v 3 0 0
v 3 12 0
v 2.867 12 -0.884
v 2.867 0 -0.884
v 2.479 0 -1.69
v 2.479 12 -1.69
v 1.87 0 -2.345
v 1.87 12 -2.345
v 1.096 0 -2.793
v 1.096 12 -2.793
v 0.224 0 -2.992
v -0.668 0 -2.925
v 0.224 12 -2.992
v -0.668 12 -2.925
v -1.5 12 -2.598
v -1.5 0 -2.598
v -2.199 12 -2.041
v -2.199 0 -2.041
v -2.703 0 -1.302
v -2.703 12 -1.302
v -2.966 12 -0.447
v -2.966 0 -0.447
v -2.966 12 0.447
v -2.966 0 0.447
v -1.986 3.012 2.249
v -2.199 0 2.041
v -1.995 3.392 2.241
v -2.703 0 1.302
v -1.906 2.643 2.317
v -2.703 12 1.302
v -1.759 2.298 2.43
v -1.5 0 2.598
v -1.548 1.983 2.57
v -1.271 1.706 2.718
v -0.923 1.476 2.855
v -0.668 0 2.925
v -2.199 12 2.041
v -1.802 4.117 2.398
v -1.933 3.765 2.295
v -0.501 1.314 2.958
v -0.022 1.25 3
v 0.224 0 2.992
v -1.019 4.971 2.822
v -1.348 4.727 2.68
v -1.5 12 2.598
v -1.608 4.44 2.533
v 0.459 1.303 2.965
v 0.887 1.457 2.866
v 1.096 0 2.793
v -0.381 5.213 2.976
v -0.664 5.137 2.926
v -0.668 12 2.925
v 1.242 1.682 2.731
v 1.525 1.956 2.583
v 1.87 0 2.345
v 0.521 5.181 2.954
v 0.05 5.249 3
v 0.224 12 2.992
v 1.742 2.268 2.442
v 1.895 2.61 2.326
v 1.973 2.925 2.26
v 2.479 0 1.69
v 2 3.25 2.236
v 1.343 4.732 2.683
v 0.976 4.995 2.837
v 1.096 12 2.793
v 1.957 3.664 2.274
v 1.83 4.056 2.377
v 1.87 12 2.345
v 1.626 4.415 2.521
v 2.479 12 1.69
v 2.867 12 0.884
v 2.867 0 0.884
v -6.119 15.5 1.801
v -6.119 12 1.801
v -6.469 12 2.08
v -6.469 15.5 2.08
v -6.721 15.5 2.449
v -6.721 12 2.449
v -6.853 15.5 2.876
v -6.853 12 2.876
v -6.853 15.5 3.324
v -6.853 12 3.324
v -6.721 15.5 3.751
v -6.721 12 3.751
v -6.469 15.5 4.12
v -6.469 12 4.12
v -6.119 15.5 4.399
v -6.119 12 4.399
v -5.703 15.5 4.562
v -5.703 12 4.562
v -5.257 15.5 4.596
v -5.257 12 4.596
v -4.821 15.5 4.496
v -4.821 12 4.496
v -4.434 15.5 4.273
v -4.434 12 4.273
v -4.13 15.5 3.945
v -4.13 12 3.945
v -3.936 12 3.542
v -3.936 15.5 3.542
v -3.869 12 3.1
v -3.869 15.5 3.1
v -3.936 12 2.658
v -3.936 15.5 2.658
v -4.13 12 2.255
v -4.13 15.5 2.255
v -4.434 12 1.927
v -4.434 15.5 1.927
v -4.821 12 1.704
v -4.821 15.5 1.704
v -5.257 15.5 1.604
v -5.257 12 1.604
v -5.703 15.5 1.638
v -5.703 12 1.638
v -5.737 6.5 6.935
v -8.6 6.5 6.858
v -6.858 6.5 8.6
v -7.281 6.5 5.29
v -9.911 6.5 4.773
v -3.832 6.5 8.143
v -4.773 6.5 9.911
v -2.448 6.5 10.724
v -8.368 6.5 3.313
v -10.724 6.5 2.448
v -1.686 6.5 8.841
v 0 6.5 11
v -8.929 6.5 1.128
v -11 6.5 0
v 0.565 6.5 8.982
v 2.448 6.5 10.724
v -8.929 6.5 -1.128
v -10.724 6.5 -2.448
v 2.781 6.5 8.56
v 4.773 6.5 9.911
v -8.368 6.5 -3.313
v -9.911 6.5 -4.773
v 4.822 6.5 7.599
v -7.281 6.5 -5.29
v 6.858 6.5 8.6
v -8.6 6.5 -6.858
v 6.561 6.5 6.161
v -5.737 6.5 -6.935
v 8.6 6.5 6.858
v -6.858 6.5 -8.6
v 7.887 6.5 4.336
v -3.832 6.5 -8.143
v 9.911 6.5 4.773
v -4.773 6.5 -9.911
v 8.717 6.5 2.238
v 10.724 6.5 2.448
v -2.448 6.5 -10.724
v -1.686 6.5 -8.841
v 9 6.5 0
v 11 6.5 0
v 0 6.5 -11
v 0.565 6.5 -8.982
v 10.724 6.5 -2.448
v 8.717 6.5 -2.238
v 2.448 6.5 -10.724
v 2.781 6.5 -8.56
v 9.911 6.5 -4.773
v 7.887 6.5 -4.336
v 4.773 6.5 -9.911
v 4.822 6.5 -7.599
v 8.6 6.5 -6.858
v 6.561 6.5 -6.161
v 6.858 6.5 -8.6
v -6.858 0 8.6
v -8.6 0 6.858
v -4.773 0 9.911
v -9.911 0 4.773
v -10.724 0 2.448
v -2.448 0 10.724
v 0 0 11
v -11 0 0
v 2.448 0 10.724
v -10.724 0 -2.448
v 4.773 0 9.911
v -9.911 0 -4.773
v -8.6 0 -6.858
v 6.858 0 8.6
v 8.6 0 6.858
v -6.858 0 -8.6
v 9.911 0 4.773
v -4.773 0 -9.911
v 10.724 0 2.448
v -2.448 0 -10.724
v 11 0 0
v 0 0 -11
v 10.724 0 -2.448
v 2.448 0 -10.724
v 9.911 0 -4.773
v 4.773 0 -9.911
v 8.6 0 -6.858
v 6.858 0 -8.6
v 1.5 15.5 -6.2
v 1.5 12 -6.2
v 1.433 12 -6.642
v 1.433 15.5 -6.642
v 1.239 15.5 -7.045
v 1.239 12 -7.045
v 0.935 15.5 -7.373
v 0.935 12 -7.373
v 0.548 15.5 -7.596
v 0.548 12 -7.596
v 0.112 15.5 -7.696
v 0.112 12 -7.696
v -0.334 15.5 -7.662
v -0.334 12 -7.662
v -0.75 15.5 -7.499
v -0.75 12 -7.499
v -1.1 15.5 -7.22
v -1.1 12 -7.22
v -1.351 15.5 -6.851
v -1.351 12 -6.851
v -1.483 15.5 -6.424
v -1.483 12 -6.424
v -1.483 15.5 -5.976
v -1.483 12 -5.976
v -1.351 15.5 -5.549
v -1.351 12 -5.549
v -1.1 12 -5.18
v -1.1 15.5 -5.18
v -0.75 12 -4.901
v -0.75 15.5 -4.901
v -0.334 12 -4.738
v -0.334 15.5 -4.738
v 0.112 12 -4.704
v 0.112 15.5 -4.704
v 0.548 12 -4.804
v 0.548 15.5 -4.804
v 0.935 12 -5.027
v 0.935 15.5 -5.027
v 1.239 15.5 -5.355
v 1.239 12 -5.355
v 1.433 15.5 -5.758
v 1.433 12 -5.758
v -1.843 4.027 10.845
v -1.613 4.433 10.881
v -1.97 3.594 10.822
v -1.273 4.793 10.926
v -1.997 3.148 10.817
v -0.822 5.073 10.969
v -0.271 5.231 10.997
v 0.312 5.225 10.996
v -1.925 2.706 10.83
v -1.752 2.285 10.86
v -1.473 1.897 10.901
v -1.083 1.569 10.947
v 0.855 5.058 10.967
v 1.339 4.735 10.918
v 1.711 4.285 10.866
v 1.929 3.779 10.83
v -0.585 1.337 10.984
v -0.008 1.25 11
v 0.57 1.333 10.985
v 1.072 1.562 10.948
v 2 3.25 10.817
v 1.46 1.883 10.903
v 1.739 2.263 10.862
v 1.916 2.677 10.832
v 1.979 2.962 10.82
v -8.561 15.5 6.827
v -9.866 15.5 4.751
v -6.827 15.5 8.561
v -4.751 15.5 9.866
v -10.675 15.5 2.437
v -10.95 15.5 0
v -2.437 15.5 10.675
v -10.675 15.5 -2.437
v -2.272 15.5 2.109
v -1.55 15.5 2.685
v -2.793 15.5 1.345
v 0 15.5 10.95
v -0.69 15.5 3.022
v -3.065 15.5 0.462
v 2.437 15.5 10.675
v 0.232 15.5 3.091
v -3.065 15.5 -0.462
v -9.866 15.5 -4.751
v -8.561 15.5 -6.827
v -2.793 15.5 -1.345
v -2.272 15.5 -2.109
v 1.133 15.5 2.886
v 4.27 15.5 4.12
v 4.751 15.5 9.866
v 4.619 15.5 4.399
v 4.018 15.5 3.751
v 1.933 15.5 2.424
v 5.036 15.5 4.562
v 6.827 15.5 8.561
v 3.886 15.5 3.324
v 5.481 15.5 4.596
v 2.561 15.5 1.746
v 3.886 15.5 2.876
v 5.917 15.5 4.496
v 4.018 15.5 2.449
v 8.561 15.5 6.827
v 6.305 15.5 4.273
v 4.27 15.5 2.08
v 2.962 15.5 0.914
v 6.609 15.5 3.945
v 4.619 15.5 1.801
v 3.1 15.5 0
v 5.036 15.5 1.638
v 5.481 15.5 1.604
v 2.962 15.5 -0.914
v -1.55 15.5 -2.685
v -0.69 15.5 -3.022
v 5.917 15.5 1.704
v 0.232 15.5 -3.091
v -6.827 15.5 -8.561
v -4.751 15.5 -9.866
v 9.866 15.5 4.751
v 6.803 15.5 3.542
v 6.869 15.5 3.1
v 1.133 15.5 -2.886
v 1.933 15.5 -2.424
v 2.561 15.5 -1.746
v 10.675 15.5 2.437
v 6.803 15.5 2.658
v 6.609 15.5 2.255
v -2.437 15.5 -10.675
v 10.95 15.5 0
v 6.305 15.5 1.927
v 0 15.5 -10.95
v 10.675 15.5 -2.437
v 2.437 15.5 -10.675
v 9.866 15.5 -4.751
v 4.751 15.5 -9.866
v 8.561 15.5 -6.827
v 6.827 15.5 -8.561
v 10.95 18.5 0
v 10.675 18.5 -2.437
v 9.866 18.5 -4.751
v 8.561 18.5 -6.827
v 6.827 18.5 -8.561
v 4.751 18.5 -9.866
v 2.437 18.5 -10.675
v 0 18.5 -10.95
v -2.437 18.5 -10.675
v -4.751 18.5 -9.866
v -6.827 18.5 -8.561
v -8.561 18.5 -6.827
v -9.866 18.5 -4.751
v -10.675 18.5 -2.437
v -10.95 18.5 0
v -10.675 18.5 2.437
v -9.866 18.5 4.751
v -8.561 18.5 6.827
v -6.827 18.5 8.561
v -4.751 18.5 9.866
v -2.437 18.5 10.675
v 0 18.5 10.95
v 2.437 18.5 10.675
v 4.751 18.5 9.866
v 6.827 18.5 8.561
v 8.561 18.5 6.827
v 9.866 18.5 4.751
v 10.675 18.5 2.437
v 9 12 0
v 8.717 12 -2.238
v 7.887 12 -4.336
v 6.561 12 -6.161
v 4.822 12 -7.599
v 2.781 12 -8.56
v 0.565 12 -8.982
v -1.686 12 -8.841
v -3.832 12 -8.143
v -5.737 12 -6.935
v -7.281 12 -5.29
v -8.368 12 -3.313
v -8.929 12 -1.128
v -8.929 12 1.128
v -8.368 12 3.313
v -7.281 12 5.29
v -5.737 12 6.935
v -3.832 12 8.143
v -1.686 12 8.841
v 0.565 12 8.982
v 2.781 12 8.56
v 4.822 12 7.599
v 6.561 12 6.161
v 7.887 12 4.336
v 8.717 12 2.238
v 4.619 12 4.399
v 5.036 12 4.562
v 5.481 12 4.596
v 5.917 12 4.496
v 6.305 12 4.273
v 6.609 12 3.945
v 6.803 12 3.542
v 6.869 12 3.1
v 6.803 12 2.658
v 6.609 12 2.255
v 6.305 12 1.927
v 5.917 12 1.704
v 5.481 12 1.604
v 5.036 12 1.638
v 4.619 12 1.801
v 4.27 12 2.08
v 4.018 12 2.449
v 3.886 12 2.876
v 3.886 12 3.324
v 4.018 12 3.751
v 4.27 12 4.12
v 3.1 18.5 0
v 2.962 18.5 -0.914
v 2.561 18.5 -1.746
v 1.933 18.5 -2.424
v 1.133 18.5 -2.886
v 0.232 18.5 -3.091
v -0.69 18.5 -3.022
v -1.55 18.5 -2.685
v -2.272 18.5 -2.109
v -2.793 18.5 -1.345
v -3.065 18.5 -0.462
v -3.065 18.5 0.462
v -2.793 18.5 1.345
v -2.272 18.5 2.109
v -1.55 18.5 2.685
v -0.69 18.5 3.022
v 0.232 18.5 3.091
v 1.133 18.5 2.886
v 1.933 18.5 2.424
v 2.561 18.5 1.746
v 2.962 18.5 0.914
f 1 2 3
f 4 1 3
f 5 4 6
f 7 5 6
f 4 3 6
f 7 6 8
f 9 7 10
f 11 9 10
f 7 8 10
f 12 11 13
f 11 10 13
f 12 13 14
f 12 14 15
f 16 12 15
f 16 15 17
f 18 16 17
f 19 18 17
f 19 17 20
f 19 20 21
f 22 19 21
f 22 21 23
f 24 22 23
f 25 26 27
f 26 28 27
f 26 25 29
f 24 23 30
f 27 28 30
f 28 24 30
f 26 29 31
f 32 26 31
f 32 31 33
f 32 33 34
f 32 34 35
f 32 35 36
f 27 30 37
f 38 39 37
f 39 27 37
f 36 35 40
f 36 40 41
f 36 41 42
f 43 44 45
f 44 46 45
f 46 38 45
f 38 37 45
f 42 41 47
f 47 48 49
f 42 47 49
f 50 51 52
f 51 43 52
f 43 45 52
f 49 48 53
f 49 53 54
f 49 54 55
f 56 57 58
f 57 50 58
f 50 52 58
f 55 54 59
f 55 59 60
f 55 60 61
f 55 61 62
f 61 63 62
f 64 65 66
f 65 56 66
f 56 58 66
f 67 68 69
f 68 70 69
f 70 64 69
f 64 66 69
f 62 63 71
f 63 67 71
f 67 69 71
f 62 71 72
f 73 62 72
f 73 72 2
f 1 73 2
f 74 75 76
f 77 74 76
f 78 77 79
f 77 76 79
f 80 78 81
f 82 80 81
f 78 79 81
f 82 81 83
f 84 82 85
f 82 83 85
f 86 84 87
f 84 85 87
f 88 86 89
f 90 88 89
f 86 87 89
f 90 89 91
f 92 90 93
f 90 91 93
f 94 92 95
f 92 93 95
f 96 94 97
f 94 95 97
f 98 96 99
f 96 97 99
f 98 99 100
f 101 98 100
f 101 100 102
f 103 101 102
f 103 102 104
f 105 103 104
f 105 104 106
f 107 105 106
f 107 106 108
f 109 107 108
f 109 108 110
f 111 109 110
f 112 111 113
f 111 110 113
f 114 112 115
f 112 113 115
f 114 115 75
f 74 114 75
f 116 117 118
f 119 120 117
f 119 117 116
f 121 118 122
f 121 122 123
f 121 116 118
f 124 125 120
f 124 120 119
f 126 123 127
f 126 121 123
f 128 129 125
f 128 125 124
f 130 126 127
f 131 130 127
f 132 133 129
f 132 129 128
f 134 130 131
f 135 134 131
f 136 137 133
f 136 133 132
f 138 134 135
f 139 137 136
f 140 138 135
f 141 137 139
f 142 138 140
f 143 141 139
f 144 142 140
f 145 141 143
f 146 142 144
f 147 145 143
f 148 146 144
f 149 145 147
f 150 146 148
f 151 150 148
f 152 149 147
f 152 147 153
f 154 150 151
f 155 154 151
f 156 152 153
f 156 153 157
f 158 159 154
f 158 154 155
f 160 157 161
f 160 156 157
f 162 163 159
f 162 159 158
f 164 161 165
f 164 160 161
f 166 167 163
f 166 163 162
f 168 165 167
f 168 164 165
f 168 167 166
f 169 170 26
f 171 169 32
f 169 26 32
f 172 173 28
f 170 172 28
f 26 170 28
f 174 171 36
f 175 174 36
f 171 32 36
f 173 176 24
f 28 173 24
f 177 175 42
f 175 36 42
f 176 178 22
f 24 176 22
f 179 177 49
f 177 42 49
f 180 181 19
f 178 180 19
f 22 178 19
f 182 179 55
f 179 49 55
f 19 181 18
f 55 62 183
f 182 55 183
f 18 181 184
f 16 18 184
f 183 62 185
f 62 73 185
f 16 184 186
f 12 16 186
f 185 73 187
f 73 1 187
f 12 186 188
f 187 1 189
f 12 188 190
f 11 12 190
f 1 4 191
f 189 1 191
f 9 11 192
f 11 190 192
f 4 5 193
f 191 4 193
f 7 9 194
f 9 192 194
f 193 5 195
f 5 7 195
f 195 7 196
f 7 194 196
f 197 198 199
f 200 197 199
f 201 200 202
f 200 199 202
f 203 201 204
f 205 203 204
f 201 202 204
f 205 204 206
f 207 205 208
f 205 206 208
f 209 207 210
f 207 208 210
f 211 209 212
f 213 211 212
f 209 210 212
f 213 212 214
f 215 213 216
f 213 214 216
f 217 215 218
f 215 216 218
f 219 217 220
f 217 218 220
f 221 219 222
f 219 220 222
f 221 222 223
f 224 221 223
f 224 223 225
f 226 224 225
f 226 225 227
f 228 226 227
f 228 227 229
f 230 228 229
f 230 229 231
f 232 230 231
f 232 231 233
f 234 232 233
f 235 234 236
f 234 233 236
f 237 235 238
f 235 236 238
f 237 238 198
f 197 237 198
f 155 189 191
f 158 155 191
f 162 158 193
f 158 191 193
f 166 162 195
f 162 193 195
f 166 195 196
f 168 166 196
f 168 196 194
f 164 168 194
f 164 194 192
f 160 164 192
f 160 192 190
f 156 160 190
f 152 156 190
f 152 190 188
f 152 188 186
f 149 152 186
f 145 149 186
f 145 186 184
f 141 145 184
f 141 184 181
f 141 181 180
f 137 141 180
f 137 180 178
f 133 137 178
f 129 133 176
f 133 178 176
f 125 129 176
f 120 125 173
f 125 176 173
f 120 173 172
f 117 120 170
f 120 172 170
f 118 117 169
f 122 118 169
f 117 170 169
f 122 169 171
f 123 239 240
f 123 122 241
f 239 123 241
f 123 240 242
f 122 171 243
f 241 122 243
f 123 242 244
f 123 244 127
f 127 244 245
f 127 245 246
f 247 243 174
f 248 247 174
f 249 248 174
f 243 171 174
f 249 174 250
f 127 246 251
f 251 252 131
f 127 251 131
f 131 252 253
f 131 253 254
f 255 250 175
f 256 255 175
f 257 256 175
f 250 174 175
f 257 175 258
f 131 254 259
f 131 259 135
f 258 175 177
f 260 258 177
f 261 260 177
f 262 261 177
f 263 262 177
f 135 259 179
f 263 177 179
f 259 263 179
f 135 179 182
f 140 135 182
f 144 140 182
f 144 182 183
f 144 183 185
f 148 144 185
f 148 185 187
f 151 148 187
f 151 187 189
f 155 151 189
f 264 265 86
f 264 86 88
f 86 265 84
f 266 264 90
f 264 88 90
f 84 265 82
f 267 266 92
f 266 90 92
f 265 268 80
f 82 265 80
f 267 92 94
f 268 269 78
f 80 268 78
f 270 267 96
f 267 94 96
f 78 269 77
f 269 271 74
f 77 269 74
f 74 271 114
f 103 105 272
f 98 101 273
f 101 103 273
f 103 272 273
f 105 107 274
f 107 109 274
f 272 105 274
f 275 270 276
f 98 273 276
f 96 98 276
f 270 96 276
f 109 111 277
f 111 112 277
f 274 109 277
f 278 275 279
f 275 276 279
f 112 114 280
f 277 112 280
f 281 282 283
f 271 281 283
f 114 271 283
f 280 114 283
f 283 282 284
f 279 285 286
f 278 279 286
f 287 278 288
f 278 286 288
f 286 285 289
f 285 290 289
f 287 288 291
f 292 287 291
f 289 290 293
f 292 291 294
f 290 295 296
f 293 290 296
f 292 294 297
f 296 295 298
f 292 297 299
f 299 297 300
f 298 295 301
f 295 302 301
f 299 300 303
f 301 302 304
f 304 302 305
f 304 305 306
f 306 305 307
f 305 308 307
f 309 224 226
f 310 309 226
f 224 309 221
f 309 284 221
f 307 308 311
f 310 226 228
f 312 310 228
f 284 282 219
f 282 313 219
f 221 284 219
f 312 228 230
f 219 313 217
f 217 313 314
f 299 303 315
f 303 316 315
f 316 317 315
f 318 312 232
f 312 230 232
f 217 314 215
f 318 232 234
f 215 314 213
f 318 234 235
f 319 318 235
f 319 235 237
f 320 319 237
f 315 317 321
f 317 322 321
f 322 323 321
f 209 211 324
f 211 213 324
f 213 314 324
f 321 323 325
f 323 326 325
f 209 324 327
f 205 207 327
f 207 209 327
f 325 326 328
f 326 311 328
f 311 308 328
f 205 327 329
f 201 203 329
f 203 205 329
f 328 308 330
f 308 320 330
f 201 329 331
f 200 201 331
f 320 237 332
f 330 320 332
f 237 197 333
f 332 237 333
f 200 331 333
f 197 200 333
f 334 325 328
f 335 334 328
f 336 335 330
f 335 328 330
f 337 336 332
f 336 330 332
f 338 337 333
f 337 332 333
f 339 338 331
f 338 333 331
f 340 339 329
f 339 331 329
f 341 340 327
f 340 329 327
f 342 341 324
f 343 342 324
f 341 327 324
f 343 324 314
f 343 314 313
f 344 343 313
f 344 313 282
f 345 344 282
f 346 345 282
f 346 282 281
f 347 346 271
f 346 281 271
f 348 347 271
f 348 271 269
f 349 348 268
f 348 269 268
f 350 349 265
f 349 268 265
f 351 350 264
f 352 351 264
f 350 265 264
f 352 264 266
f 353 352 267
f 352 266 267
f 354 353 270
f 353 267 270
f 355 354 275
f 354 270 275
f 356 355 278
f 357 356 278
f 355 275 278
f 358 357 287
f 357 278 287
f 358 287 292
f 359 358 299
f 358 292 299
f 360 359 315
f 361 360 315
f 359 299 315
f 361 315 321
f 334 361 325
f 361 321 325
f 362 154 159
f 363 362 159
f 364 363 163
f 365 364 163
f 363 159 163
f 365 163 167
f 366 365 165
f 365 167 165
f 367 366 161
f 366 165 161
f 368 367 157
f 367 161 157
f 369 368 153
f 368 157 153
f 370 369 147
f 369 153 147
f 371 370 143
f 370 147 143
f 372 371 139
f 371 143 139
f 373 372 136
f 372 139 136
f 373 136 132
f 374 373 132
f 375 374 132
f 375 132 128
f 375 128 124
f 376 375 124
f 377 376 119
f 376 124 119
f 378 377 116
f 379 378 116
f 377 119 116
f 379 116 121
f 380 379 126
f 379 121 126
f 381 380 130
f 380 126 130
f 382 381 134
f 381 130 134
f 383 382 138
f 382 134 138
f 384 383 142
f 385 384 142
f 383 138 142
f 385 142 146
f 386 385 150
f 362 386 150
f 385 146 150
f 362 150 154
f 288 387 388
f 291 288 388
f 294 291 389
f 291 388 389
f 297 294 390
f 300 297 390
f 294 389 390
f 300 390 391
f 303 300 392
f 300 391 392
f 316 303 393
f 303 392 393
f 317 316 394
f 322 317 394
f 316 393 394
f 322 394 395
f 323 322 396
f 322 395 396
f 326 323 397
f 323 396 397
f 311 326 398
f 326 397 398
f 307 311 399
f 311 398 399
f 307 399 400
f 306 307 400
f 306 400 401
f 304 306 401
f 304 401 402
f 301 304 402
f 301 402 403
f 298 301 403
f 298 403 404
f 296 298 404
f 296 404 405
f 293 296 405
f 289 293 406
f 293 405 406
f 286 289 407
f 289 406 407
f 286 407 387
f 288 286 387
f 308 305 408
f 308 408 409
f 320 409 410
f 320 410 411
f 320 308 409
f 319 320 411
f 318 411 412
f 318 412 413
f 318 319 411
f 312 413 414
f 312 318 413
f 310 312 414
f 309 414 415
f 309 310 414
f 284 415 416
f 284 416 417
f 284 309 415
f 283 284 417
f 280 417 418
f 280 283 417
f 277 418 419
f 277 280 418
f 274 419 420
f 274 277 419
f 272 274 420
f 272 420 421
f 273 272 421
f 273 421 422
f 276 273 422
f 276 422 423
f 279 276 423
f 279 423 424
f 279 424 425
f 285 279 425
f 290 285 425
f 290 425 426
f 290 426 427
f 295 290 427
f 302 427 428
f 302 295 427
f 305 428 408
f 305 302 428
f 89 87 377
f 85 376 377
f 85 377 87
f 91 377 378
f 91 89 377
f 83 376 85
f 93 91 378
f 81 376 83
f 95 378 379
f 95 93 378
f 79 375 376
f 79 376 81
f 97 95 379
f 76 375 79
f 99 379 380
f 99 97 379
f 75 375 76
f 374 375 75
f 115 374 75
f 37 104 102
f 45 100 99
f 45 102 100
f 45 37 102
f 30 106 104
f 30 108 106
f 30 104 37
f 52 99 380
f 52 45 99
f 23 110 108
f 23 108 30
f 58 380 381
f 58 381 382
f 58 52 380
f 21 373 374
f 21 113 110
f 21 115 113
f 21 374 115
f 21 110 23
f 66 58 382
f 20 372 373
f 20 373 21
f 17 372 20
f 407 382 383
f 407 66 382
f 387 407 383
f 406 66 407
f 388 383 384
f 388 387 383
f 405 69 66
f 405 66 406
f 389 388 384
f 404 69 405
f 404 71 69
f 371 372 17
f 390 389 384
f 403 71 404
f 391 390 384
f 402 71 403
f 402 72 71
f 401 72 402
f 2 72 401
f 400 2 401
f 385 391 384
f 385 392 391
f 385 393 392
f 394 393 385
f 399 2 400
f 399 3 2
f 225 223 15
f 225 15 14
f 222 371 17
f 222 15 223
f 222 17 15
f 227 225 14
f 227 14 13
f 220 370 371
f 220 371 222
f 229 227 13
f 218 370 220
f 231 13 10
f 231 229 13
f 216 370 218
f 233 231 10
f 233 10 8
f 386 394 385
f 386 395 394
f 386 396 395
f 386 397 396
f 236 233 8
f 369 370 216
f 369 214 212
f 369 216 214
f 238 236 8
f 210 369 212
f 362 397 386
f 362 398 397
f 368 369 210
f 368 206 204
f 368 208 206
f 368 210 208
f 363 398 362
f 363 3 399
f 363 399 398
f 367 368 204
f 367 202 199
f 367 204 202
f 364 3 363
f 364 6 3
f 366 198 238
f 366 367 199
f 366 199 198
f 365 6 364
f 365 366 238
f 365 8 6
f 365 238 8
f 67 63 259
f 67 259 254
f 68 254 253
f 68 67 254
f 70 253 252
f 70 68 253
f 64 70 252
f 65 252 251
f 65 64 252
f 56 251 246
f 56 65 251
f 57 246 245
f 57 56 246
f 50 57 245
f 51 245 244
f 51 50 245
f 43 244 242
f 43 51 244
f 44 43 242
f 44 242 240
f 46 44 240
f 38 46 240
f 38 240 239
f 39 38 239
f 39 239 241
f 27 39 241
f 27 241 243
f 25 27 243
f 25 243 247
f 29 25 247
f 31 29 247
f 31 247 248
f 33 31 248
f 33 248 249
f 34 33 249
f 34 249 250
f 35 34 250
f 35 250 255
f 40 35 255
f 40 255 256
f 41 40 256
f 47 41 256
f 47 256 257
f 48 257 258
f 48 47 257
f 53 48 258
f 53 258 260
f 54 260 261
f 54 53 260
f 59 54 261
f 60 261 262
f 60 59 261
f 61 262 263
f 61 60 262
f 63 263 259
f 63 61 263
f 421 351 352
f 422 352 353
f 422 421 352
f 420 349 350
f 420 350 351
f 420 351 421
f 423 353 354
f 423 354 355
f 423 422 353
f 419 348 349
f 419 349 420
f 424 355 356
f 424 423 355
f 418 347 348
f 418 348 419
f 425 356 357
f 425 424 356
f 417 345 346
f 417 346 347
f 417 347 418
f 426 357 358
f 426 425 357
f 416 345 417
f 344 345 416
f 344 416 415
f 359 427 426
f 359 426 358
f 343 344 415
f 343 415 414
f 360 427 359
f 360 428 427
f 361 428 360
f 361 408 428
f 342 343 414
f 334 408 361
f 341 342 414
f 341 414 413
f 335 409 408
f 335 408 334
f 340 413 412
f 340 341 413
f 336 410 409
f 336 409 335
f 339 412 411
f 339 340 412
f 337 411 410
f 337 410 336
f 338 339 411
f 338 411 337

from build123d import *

# Parameters (mm, degrees)
SKETCH1_R           = 11
BOSS_EXTRUDE1_DEPTH = 6.5
SKETCH2_R           = 9
BOSS_EXTRUDE2_DEPTH = 5.5
SKETCH3_R           = 3
CUT_EXTRUDE1_DEPTH  = 13
SKETCH4_R           = 1.5
BOSS_EXTRUDE3_DEPTH = 3.5
CIRPATTERN1_COUNT   = 3
SKETCH5_R           = 10.95
SKETCH5_R_2         = 3.1
BOSS_EXTRUDE4_DEPTH = 3
SKETCH7_R           = 2
CUT_EXTRUDE2_DEPTH  = 12


with BuildPart() as part:
    # Sketch1 → Boss-Extrude1 (new body)
    with BuildSketch(Plane(origin=(0, 0, 0), x_dir=(1, 0, 0), z_dir=(0, 1, 0))):
        Circle(SKETCH1_R)
    extrude(amount=BOSS_EXTRUDE1_DEPTH)

    # Sketch2 → Boss-Extrude2 (add)
    with BuildSketch(Plane(origin=(0, 6.5, 0), x_dir=(1, 0, 0), z_dir=(0, 1, 0))):
        Circle(SKETCH2_R)
    extrude(amount=BOSS_EXTRUDE2_DEPTH)

    # Sketch3 → Cut-Extrude1 (cut, through all)
    with BuildSketch(Plane(origin=(0, 12, 0), x_dir=(1, 0, 0), z_dir=(0, 1, 0))):
        Circle(SKETCH3_R)
    extrude(amount=-CUT_EXTRUDE1_DEPTH, mode=Mode.SUBTRACT)

    # Sketch4 → Boss-Extrude3 (add)
    with BuildSketch(Plane(origin=(0, 12, 0), x_dir=(1, 0, 0), z_dir=(0, 1, 0))):
        with Locations((0, 6.2)):
            Circle(SKETCH4_R)
    boss_extrude3 = extrude(amount=BOSS_EXTRUDE3_DEPTH)

    # CirPattern1: Boss-Extrude3 ×3 about axis
    cirpattern1_axis = Axis((0, 0, 0), (0, 1, 0))
    for i in range(1, CIRPATTERN1_COUNT):
        add(boss_extrude3.rotate(cirpattern1_axis, i * 360 / CIRPATTERN1_COUNT))

    # Sketch5 → Boss-Extrude4 (add)
    with BuildSketch(Plane(origin=(0, 15.5, 0), x_dir=(1, 0, 0), z_dir=(0, 1, 0))):
        Circle(SKETCH5_R)
        Circle(SKETCH5_R_2, mode=Mode.SUBTRACT)
    extrude(amount=BOSS_EXTRUDE4_DEPTH)

    # Sketch7 → Cut-Extrude2 (cut, through all)
    with BuildSketch(Plane.XY):
        with Locations((0, 3.25)):
            Circle(SKETCH7_R)
    extrude(amount=CUT_EXTRUDE2_DEPTH, mode=Mode.SUBTRACT)


solid = part.part
